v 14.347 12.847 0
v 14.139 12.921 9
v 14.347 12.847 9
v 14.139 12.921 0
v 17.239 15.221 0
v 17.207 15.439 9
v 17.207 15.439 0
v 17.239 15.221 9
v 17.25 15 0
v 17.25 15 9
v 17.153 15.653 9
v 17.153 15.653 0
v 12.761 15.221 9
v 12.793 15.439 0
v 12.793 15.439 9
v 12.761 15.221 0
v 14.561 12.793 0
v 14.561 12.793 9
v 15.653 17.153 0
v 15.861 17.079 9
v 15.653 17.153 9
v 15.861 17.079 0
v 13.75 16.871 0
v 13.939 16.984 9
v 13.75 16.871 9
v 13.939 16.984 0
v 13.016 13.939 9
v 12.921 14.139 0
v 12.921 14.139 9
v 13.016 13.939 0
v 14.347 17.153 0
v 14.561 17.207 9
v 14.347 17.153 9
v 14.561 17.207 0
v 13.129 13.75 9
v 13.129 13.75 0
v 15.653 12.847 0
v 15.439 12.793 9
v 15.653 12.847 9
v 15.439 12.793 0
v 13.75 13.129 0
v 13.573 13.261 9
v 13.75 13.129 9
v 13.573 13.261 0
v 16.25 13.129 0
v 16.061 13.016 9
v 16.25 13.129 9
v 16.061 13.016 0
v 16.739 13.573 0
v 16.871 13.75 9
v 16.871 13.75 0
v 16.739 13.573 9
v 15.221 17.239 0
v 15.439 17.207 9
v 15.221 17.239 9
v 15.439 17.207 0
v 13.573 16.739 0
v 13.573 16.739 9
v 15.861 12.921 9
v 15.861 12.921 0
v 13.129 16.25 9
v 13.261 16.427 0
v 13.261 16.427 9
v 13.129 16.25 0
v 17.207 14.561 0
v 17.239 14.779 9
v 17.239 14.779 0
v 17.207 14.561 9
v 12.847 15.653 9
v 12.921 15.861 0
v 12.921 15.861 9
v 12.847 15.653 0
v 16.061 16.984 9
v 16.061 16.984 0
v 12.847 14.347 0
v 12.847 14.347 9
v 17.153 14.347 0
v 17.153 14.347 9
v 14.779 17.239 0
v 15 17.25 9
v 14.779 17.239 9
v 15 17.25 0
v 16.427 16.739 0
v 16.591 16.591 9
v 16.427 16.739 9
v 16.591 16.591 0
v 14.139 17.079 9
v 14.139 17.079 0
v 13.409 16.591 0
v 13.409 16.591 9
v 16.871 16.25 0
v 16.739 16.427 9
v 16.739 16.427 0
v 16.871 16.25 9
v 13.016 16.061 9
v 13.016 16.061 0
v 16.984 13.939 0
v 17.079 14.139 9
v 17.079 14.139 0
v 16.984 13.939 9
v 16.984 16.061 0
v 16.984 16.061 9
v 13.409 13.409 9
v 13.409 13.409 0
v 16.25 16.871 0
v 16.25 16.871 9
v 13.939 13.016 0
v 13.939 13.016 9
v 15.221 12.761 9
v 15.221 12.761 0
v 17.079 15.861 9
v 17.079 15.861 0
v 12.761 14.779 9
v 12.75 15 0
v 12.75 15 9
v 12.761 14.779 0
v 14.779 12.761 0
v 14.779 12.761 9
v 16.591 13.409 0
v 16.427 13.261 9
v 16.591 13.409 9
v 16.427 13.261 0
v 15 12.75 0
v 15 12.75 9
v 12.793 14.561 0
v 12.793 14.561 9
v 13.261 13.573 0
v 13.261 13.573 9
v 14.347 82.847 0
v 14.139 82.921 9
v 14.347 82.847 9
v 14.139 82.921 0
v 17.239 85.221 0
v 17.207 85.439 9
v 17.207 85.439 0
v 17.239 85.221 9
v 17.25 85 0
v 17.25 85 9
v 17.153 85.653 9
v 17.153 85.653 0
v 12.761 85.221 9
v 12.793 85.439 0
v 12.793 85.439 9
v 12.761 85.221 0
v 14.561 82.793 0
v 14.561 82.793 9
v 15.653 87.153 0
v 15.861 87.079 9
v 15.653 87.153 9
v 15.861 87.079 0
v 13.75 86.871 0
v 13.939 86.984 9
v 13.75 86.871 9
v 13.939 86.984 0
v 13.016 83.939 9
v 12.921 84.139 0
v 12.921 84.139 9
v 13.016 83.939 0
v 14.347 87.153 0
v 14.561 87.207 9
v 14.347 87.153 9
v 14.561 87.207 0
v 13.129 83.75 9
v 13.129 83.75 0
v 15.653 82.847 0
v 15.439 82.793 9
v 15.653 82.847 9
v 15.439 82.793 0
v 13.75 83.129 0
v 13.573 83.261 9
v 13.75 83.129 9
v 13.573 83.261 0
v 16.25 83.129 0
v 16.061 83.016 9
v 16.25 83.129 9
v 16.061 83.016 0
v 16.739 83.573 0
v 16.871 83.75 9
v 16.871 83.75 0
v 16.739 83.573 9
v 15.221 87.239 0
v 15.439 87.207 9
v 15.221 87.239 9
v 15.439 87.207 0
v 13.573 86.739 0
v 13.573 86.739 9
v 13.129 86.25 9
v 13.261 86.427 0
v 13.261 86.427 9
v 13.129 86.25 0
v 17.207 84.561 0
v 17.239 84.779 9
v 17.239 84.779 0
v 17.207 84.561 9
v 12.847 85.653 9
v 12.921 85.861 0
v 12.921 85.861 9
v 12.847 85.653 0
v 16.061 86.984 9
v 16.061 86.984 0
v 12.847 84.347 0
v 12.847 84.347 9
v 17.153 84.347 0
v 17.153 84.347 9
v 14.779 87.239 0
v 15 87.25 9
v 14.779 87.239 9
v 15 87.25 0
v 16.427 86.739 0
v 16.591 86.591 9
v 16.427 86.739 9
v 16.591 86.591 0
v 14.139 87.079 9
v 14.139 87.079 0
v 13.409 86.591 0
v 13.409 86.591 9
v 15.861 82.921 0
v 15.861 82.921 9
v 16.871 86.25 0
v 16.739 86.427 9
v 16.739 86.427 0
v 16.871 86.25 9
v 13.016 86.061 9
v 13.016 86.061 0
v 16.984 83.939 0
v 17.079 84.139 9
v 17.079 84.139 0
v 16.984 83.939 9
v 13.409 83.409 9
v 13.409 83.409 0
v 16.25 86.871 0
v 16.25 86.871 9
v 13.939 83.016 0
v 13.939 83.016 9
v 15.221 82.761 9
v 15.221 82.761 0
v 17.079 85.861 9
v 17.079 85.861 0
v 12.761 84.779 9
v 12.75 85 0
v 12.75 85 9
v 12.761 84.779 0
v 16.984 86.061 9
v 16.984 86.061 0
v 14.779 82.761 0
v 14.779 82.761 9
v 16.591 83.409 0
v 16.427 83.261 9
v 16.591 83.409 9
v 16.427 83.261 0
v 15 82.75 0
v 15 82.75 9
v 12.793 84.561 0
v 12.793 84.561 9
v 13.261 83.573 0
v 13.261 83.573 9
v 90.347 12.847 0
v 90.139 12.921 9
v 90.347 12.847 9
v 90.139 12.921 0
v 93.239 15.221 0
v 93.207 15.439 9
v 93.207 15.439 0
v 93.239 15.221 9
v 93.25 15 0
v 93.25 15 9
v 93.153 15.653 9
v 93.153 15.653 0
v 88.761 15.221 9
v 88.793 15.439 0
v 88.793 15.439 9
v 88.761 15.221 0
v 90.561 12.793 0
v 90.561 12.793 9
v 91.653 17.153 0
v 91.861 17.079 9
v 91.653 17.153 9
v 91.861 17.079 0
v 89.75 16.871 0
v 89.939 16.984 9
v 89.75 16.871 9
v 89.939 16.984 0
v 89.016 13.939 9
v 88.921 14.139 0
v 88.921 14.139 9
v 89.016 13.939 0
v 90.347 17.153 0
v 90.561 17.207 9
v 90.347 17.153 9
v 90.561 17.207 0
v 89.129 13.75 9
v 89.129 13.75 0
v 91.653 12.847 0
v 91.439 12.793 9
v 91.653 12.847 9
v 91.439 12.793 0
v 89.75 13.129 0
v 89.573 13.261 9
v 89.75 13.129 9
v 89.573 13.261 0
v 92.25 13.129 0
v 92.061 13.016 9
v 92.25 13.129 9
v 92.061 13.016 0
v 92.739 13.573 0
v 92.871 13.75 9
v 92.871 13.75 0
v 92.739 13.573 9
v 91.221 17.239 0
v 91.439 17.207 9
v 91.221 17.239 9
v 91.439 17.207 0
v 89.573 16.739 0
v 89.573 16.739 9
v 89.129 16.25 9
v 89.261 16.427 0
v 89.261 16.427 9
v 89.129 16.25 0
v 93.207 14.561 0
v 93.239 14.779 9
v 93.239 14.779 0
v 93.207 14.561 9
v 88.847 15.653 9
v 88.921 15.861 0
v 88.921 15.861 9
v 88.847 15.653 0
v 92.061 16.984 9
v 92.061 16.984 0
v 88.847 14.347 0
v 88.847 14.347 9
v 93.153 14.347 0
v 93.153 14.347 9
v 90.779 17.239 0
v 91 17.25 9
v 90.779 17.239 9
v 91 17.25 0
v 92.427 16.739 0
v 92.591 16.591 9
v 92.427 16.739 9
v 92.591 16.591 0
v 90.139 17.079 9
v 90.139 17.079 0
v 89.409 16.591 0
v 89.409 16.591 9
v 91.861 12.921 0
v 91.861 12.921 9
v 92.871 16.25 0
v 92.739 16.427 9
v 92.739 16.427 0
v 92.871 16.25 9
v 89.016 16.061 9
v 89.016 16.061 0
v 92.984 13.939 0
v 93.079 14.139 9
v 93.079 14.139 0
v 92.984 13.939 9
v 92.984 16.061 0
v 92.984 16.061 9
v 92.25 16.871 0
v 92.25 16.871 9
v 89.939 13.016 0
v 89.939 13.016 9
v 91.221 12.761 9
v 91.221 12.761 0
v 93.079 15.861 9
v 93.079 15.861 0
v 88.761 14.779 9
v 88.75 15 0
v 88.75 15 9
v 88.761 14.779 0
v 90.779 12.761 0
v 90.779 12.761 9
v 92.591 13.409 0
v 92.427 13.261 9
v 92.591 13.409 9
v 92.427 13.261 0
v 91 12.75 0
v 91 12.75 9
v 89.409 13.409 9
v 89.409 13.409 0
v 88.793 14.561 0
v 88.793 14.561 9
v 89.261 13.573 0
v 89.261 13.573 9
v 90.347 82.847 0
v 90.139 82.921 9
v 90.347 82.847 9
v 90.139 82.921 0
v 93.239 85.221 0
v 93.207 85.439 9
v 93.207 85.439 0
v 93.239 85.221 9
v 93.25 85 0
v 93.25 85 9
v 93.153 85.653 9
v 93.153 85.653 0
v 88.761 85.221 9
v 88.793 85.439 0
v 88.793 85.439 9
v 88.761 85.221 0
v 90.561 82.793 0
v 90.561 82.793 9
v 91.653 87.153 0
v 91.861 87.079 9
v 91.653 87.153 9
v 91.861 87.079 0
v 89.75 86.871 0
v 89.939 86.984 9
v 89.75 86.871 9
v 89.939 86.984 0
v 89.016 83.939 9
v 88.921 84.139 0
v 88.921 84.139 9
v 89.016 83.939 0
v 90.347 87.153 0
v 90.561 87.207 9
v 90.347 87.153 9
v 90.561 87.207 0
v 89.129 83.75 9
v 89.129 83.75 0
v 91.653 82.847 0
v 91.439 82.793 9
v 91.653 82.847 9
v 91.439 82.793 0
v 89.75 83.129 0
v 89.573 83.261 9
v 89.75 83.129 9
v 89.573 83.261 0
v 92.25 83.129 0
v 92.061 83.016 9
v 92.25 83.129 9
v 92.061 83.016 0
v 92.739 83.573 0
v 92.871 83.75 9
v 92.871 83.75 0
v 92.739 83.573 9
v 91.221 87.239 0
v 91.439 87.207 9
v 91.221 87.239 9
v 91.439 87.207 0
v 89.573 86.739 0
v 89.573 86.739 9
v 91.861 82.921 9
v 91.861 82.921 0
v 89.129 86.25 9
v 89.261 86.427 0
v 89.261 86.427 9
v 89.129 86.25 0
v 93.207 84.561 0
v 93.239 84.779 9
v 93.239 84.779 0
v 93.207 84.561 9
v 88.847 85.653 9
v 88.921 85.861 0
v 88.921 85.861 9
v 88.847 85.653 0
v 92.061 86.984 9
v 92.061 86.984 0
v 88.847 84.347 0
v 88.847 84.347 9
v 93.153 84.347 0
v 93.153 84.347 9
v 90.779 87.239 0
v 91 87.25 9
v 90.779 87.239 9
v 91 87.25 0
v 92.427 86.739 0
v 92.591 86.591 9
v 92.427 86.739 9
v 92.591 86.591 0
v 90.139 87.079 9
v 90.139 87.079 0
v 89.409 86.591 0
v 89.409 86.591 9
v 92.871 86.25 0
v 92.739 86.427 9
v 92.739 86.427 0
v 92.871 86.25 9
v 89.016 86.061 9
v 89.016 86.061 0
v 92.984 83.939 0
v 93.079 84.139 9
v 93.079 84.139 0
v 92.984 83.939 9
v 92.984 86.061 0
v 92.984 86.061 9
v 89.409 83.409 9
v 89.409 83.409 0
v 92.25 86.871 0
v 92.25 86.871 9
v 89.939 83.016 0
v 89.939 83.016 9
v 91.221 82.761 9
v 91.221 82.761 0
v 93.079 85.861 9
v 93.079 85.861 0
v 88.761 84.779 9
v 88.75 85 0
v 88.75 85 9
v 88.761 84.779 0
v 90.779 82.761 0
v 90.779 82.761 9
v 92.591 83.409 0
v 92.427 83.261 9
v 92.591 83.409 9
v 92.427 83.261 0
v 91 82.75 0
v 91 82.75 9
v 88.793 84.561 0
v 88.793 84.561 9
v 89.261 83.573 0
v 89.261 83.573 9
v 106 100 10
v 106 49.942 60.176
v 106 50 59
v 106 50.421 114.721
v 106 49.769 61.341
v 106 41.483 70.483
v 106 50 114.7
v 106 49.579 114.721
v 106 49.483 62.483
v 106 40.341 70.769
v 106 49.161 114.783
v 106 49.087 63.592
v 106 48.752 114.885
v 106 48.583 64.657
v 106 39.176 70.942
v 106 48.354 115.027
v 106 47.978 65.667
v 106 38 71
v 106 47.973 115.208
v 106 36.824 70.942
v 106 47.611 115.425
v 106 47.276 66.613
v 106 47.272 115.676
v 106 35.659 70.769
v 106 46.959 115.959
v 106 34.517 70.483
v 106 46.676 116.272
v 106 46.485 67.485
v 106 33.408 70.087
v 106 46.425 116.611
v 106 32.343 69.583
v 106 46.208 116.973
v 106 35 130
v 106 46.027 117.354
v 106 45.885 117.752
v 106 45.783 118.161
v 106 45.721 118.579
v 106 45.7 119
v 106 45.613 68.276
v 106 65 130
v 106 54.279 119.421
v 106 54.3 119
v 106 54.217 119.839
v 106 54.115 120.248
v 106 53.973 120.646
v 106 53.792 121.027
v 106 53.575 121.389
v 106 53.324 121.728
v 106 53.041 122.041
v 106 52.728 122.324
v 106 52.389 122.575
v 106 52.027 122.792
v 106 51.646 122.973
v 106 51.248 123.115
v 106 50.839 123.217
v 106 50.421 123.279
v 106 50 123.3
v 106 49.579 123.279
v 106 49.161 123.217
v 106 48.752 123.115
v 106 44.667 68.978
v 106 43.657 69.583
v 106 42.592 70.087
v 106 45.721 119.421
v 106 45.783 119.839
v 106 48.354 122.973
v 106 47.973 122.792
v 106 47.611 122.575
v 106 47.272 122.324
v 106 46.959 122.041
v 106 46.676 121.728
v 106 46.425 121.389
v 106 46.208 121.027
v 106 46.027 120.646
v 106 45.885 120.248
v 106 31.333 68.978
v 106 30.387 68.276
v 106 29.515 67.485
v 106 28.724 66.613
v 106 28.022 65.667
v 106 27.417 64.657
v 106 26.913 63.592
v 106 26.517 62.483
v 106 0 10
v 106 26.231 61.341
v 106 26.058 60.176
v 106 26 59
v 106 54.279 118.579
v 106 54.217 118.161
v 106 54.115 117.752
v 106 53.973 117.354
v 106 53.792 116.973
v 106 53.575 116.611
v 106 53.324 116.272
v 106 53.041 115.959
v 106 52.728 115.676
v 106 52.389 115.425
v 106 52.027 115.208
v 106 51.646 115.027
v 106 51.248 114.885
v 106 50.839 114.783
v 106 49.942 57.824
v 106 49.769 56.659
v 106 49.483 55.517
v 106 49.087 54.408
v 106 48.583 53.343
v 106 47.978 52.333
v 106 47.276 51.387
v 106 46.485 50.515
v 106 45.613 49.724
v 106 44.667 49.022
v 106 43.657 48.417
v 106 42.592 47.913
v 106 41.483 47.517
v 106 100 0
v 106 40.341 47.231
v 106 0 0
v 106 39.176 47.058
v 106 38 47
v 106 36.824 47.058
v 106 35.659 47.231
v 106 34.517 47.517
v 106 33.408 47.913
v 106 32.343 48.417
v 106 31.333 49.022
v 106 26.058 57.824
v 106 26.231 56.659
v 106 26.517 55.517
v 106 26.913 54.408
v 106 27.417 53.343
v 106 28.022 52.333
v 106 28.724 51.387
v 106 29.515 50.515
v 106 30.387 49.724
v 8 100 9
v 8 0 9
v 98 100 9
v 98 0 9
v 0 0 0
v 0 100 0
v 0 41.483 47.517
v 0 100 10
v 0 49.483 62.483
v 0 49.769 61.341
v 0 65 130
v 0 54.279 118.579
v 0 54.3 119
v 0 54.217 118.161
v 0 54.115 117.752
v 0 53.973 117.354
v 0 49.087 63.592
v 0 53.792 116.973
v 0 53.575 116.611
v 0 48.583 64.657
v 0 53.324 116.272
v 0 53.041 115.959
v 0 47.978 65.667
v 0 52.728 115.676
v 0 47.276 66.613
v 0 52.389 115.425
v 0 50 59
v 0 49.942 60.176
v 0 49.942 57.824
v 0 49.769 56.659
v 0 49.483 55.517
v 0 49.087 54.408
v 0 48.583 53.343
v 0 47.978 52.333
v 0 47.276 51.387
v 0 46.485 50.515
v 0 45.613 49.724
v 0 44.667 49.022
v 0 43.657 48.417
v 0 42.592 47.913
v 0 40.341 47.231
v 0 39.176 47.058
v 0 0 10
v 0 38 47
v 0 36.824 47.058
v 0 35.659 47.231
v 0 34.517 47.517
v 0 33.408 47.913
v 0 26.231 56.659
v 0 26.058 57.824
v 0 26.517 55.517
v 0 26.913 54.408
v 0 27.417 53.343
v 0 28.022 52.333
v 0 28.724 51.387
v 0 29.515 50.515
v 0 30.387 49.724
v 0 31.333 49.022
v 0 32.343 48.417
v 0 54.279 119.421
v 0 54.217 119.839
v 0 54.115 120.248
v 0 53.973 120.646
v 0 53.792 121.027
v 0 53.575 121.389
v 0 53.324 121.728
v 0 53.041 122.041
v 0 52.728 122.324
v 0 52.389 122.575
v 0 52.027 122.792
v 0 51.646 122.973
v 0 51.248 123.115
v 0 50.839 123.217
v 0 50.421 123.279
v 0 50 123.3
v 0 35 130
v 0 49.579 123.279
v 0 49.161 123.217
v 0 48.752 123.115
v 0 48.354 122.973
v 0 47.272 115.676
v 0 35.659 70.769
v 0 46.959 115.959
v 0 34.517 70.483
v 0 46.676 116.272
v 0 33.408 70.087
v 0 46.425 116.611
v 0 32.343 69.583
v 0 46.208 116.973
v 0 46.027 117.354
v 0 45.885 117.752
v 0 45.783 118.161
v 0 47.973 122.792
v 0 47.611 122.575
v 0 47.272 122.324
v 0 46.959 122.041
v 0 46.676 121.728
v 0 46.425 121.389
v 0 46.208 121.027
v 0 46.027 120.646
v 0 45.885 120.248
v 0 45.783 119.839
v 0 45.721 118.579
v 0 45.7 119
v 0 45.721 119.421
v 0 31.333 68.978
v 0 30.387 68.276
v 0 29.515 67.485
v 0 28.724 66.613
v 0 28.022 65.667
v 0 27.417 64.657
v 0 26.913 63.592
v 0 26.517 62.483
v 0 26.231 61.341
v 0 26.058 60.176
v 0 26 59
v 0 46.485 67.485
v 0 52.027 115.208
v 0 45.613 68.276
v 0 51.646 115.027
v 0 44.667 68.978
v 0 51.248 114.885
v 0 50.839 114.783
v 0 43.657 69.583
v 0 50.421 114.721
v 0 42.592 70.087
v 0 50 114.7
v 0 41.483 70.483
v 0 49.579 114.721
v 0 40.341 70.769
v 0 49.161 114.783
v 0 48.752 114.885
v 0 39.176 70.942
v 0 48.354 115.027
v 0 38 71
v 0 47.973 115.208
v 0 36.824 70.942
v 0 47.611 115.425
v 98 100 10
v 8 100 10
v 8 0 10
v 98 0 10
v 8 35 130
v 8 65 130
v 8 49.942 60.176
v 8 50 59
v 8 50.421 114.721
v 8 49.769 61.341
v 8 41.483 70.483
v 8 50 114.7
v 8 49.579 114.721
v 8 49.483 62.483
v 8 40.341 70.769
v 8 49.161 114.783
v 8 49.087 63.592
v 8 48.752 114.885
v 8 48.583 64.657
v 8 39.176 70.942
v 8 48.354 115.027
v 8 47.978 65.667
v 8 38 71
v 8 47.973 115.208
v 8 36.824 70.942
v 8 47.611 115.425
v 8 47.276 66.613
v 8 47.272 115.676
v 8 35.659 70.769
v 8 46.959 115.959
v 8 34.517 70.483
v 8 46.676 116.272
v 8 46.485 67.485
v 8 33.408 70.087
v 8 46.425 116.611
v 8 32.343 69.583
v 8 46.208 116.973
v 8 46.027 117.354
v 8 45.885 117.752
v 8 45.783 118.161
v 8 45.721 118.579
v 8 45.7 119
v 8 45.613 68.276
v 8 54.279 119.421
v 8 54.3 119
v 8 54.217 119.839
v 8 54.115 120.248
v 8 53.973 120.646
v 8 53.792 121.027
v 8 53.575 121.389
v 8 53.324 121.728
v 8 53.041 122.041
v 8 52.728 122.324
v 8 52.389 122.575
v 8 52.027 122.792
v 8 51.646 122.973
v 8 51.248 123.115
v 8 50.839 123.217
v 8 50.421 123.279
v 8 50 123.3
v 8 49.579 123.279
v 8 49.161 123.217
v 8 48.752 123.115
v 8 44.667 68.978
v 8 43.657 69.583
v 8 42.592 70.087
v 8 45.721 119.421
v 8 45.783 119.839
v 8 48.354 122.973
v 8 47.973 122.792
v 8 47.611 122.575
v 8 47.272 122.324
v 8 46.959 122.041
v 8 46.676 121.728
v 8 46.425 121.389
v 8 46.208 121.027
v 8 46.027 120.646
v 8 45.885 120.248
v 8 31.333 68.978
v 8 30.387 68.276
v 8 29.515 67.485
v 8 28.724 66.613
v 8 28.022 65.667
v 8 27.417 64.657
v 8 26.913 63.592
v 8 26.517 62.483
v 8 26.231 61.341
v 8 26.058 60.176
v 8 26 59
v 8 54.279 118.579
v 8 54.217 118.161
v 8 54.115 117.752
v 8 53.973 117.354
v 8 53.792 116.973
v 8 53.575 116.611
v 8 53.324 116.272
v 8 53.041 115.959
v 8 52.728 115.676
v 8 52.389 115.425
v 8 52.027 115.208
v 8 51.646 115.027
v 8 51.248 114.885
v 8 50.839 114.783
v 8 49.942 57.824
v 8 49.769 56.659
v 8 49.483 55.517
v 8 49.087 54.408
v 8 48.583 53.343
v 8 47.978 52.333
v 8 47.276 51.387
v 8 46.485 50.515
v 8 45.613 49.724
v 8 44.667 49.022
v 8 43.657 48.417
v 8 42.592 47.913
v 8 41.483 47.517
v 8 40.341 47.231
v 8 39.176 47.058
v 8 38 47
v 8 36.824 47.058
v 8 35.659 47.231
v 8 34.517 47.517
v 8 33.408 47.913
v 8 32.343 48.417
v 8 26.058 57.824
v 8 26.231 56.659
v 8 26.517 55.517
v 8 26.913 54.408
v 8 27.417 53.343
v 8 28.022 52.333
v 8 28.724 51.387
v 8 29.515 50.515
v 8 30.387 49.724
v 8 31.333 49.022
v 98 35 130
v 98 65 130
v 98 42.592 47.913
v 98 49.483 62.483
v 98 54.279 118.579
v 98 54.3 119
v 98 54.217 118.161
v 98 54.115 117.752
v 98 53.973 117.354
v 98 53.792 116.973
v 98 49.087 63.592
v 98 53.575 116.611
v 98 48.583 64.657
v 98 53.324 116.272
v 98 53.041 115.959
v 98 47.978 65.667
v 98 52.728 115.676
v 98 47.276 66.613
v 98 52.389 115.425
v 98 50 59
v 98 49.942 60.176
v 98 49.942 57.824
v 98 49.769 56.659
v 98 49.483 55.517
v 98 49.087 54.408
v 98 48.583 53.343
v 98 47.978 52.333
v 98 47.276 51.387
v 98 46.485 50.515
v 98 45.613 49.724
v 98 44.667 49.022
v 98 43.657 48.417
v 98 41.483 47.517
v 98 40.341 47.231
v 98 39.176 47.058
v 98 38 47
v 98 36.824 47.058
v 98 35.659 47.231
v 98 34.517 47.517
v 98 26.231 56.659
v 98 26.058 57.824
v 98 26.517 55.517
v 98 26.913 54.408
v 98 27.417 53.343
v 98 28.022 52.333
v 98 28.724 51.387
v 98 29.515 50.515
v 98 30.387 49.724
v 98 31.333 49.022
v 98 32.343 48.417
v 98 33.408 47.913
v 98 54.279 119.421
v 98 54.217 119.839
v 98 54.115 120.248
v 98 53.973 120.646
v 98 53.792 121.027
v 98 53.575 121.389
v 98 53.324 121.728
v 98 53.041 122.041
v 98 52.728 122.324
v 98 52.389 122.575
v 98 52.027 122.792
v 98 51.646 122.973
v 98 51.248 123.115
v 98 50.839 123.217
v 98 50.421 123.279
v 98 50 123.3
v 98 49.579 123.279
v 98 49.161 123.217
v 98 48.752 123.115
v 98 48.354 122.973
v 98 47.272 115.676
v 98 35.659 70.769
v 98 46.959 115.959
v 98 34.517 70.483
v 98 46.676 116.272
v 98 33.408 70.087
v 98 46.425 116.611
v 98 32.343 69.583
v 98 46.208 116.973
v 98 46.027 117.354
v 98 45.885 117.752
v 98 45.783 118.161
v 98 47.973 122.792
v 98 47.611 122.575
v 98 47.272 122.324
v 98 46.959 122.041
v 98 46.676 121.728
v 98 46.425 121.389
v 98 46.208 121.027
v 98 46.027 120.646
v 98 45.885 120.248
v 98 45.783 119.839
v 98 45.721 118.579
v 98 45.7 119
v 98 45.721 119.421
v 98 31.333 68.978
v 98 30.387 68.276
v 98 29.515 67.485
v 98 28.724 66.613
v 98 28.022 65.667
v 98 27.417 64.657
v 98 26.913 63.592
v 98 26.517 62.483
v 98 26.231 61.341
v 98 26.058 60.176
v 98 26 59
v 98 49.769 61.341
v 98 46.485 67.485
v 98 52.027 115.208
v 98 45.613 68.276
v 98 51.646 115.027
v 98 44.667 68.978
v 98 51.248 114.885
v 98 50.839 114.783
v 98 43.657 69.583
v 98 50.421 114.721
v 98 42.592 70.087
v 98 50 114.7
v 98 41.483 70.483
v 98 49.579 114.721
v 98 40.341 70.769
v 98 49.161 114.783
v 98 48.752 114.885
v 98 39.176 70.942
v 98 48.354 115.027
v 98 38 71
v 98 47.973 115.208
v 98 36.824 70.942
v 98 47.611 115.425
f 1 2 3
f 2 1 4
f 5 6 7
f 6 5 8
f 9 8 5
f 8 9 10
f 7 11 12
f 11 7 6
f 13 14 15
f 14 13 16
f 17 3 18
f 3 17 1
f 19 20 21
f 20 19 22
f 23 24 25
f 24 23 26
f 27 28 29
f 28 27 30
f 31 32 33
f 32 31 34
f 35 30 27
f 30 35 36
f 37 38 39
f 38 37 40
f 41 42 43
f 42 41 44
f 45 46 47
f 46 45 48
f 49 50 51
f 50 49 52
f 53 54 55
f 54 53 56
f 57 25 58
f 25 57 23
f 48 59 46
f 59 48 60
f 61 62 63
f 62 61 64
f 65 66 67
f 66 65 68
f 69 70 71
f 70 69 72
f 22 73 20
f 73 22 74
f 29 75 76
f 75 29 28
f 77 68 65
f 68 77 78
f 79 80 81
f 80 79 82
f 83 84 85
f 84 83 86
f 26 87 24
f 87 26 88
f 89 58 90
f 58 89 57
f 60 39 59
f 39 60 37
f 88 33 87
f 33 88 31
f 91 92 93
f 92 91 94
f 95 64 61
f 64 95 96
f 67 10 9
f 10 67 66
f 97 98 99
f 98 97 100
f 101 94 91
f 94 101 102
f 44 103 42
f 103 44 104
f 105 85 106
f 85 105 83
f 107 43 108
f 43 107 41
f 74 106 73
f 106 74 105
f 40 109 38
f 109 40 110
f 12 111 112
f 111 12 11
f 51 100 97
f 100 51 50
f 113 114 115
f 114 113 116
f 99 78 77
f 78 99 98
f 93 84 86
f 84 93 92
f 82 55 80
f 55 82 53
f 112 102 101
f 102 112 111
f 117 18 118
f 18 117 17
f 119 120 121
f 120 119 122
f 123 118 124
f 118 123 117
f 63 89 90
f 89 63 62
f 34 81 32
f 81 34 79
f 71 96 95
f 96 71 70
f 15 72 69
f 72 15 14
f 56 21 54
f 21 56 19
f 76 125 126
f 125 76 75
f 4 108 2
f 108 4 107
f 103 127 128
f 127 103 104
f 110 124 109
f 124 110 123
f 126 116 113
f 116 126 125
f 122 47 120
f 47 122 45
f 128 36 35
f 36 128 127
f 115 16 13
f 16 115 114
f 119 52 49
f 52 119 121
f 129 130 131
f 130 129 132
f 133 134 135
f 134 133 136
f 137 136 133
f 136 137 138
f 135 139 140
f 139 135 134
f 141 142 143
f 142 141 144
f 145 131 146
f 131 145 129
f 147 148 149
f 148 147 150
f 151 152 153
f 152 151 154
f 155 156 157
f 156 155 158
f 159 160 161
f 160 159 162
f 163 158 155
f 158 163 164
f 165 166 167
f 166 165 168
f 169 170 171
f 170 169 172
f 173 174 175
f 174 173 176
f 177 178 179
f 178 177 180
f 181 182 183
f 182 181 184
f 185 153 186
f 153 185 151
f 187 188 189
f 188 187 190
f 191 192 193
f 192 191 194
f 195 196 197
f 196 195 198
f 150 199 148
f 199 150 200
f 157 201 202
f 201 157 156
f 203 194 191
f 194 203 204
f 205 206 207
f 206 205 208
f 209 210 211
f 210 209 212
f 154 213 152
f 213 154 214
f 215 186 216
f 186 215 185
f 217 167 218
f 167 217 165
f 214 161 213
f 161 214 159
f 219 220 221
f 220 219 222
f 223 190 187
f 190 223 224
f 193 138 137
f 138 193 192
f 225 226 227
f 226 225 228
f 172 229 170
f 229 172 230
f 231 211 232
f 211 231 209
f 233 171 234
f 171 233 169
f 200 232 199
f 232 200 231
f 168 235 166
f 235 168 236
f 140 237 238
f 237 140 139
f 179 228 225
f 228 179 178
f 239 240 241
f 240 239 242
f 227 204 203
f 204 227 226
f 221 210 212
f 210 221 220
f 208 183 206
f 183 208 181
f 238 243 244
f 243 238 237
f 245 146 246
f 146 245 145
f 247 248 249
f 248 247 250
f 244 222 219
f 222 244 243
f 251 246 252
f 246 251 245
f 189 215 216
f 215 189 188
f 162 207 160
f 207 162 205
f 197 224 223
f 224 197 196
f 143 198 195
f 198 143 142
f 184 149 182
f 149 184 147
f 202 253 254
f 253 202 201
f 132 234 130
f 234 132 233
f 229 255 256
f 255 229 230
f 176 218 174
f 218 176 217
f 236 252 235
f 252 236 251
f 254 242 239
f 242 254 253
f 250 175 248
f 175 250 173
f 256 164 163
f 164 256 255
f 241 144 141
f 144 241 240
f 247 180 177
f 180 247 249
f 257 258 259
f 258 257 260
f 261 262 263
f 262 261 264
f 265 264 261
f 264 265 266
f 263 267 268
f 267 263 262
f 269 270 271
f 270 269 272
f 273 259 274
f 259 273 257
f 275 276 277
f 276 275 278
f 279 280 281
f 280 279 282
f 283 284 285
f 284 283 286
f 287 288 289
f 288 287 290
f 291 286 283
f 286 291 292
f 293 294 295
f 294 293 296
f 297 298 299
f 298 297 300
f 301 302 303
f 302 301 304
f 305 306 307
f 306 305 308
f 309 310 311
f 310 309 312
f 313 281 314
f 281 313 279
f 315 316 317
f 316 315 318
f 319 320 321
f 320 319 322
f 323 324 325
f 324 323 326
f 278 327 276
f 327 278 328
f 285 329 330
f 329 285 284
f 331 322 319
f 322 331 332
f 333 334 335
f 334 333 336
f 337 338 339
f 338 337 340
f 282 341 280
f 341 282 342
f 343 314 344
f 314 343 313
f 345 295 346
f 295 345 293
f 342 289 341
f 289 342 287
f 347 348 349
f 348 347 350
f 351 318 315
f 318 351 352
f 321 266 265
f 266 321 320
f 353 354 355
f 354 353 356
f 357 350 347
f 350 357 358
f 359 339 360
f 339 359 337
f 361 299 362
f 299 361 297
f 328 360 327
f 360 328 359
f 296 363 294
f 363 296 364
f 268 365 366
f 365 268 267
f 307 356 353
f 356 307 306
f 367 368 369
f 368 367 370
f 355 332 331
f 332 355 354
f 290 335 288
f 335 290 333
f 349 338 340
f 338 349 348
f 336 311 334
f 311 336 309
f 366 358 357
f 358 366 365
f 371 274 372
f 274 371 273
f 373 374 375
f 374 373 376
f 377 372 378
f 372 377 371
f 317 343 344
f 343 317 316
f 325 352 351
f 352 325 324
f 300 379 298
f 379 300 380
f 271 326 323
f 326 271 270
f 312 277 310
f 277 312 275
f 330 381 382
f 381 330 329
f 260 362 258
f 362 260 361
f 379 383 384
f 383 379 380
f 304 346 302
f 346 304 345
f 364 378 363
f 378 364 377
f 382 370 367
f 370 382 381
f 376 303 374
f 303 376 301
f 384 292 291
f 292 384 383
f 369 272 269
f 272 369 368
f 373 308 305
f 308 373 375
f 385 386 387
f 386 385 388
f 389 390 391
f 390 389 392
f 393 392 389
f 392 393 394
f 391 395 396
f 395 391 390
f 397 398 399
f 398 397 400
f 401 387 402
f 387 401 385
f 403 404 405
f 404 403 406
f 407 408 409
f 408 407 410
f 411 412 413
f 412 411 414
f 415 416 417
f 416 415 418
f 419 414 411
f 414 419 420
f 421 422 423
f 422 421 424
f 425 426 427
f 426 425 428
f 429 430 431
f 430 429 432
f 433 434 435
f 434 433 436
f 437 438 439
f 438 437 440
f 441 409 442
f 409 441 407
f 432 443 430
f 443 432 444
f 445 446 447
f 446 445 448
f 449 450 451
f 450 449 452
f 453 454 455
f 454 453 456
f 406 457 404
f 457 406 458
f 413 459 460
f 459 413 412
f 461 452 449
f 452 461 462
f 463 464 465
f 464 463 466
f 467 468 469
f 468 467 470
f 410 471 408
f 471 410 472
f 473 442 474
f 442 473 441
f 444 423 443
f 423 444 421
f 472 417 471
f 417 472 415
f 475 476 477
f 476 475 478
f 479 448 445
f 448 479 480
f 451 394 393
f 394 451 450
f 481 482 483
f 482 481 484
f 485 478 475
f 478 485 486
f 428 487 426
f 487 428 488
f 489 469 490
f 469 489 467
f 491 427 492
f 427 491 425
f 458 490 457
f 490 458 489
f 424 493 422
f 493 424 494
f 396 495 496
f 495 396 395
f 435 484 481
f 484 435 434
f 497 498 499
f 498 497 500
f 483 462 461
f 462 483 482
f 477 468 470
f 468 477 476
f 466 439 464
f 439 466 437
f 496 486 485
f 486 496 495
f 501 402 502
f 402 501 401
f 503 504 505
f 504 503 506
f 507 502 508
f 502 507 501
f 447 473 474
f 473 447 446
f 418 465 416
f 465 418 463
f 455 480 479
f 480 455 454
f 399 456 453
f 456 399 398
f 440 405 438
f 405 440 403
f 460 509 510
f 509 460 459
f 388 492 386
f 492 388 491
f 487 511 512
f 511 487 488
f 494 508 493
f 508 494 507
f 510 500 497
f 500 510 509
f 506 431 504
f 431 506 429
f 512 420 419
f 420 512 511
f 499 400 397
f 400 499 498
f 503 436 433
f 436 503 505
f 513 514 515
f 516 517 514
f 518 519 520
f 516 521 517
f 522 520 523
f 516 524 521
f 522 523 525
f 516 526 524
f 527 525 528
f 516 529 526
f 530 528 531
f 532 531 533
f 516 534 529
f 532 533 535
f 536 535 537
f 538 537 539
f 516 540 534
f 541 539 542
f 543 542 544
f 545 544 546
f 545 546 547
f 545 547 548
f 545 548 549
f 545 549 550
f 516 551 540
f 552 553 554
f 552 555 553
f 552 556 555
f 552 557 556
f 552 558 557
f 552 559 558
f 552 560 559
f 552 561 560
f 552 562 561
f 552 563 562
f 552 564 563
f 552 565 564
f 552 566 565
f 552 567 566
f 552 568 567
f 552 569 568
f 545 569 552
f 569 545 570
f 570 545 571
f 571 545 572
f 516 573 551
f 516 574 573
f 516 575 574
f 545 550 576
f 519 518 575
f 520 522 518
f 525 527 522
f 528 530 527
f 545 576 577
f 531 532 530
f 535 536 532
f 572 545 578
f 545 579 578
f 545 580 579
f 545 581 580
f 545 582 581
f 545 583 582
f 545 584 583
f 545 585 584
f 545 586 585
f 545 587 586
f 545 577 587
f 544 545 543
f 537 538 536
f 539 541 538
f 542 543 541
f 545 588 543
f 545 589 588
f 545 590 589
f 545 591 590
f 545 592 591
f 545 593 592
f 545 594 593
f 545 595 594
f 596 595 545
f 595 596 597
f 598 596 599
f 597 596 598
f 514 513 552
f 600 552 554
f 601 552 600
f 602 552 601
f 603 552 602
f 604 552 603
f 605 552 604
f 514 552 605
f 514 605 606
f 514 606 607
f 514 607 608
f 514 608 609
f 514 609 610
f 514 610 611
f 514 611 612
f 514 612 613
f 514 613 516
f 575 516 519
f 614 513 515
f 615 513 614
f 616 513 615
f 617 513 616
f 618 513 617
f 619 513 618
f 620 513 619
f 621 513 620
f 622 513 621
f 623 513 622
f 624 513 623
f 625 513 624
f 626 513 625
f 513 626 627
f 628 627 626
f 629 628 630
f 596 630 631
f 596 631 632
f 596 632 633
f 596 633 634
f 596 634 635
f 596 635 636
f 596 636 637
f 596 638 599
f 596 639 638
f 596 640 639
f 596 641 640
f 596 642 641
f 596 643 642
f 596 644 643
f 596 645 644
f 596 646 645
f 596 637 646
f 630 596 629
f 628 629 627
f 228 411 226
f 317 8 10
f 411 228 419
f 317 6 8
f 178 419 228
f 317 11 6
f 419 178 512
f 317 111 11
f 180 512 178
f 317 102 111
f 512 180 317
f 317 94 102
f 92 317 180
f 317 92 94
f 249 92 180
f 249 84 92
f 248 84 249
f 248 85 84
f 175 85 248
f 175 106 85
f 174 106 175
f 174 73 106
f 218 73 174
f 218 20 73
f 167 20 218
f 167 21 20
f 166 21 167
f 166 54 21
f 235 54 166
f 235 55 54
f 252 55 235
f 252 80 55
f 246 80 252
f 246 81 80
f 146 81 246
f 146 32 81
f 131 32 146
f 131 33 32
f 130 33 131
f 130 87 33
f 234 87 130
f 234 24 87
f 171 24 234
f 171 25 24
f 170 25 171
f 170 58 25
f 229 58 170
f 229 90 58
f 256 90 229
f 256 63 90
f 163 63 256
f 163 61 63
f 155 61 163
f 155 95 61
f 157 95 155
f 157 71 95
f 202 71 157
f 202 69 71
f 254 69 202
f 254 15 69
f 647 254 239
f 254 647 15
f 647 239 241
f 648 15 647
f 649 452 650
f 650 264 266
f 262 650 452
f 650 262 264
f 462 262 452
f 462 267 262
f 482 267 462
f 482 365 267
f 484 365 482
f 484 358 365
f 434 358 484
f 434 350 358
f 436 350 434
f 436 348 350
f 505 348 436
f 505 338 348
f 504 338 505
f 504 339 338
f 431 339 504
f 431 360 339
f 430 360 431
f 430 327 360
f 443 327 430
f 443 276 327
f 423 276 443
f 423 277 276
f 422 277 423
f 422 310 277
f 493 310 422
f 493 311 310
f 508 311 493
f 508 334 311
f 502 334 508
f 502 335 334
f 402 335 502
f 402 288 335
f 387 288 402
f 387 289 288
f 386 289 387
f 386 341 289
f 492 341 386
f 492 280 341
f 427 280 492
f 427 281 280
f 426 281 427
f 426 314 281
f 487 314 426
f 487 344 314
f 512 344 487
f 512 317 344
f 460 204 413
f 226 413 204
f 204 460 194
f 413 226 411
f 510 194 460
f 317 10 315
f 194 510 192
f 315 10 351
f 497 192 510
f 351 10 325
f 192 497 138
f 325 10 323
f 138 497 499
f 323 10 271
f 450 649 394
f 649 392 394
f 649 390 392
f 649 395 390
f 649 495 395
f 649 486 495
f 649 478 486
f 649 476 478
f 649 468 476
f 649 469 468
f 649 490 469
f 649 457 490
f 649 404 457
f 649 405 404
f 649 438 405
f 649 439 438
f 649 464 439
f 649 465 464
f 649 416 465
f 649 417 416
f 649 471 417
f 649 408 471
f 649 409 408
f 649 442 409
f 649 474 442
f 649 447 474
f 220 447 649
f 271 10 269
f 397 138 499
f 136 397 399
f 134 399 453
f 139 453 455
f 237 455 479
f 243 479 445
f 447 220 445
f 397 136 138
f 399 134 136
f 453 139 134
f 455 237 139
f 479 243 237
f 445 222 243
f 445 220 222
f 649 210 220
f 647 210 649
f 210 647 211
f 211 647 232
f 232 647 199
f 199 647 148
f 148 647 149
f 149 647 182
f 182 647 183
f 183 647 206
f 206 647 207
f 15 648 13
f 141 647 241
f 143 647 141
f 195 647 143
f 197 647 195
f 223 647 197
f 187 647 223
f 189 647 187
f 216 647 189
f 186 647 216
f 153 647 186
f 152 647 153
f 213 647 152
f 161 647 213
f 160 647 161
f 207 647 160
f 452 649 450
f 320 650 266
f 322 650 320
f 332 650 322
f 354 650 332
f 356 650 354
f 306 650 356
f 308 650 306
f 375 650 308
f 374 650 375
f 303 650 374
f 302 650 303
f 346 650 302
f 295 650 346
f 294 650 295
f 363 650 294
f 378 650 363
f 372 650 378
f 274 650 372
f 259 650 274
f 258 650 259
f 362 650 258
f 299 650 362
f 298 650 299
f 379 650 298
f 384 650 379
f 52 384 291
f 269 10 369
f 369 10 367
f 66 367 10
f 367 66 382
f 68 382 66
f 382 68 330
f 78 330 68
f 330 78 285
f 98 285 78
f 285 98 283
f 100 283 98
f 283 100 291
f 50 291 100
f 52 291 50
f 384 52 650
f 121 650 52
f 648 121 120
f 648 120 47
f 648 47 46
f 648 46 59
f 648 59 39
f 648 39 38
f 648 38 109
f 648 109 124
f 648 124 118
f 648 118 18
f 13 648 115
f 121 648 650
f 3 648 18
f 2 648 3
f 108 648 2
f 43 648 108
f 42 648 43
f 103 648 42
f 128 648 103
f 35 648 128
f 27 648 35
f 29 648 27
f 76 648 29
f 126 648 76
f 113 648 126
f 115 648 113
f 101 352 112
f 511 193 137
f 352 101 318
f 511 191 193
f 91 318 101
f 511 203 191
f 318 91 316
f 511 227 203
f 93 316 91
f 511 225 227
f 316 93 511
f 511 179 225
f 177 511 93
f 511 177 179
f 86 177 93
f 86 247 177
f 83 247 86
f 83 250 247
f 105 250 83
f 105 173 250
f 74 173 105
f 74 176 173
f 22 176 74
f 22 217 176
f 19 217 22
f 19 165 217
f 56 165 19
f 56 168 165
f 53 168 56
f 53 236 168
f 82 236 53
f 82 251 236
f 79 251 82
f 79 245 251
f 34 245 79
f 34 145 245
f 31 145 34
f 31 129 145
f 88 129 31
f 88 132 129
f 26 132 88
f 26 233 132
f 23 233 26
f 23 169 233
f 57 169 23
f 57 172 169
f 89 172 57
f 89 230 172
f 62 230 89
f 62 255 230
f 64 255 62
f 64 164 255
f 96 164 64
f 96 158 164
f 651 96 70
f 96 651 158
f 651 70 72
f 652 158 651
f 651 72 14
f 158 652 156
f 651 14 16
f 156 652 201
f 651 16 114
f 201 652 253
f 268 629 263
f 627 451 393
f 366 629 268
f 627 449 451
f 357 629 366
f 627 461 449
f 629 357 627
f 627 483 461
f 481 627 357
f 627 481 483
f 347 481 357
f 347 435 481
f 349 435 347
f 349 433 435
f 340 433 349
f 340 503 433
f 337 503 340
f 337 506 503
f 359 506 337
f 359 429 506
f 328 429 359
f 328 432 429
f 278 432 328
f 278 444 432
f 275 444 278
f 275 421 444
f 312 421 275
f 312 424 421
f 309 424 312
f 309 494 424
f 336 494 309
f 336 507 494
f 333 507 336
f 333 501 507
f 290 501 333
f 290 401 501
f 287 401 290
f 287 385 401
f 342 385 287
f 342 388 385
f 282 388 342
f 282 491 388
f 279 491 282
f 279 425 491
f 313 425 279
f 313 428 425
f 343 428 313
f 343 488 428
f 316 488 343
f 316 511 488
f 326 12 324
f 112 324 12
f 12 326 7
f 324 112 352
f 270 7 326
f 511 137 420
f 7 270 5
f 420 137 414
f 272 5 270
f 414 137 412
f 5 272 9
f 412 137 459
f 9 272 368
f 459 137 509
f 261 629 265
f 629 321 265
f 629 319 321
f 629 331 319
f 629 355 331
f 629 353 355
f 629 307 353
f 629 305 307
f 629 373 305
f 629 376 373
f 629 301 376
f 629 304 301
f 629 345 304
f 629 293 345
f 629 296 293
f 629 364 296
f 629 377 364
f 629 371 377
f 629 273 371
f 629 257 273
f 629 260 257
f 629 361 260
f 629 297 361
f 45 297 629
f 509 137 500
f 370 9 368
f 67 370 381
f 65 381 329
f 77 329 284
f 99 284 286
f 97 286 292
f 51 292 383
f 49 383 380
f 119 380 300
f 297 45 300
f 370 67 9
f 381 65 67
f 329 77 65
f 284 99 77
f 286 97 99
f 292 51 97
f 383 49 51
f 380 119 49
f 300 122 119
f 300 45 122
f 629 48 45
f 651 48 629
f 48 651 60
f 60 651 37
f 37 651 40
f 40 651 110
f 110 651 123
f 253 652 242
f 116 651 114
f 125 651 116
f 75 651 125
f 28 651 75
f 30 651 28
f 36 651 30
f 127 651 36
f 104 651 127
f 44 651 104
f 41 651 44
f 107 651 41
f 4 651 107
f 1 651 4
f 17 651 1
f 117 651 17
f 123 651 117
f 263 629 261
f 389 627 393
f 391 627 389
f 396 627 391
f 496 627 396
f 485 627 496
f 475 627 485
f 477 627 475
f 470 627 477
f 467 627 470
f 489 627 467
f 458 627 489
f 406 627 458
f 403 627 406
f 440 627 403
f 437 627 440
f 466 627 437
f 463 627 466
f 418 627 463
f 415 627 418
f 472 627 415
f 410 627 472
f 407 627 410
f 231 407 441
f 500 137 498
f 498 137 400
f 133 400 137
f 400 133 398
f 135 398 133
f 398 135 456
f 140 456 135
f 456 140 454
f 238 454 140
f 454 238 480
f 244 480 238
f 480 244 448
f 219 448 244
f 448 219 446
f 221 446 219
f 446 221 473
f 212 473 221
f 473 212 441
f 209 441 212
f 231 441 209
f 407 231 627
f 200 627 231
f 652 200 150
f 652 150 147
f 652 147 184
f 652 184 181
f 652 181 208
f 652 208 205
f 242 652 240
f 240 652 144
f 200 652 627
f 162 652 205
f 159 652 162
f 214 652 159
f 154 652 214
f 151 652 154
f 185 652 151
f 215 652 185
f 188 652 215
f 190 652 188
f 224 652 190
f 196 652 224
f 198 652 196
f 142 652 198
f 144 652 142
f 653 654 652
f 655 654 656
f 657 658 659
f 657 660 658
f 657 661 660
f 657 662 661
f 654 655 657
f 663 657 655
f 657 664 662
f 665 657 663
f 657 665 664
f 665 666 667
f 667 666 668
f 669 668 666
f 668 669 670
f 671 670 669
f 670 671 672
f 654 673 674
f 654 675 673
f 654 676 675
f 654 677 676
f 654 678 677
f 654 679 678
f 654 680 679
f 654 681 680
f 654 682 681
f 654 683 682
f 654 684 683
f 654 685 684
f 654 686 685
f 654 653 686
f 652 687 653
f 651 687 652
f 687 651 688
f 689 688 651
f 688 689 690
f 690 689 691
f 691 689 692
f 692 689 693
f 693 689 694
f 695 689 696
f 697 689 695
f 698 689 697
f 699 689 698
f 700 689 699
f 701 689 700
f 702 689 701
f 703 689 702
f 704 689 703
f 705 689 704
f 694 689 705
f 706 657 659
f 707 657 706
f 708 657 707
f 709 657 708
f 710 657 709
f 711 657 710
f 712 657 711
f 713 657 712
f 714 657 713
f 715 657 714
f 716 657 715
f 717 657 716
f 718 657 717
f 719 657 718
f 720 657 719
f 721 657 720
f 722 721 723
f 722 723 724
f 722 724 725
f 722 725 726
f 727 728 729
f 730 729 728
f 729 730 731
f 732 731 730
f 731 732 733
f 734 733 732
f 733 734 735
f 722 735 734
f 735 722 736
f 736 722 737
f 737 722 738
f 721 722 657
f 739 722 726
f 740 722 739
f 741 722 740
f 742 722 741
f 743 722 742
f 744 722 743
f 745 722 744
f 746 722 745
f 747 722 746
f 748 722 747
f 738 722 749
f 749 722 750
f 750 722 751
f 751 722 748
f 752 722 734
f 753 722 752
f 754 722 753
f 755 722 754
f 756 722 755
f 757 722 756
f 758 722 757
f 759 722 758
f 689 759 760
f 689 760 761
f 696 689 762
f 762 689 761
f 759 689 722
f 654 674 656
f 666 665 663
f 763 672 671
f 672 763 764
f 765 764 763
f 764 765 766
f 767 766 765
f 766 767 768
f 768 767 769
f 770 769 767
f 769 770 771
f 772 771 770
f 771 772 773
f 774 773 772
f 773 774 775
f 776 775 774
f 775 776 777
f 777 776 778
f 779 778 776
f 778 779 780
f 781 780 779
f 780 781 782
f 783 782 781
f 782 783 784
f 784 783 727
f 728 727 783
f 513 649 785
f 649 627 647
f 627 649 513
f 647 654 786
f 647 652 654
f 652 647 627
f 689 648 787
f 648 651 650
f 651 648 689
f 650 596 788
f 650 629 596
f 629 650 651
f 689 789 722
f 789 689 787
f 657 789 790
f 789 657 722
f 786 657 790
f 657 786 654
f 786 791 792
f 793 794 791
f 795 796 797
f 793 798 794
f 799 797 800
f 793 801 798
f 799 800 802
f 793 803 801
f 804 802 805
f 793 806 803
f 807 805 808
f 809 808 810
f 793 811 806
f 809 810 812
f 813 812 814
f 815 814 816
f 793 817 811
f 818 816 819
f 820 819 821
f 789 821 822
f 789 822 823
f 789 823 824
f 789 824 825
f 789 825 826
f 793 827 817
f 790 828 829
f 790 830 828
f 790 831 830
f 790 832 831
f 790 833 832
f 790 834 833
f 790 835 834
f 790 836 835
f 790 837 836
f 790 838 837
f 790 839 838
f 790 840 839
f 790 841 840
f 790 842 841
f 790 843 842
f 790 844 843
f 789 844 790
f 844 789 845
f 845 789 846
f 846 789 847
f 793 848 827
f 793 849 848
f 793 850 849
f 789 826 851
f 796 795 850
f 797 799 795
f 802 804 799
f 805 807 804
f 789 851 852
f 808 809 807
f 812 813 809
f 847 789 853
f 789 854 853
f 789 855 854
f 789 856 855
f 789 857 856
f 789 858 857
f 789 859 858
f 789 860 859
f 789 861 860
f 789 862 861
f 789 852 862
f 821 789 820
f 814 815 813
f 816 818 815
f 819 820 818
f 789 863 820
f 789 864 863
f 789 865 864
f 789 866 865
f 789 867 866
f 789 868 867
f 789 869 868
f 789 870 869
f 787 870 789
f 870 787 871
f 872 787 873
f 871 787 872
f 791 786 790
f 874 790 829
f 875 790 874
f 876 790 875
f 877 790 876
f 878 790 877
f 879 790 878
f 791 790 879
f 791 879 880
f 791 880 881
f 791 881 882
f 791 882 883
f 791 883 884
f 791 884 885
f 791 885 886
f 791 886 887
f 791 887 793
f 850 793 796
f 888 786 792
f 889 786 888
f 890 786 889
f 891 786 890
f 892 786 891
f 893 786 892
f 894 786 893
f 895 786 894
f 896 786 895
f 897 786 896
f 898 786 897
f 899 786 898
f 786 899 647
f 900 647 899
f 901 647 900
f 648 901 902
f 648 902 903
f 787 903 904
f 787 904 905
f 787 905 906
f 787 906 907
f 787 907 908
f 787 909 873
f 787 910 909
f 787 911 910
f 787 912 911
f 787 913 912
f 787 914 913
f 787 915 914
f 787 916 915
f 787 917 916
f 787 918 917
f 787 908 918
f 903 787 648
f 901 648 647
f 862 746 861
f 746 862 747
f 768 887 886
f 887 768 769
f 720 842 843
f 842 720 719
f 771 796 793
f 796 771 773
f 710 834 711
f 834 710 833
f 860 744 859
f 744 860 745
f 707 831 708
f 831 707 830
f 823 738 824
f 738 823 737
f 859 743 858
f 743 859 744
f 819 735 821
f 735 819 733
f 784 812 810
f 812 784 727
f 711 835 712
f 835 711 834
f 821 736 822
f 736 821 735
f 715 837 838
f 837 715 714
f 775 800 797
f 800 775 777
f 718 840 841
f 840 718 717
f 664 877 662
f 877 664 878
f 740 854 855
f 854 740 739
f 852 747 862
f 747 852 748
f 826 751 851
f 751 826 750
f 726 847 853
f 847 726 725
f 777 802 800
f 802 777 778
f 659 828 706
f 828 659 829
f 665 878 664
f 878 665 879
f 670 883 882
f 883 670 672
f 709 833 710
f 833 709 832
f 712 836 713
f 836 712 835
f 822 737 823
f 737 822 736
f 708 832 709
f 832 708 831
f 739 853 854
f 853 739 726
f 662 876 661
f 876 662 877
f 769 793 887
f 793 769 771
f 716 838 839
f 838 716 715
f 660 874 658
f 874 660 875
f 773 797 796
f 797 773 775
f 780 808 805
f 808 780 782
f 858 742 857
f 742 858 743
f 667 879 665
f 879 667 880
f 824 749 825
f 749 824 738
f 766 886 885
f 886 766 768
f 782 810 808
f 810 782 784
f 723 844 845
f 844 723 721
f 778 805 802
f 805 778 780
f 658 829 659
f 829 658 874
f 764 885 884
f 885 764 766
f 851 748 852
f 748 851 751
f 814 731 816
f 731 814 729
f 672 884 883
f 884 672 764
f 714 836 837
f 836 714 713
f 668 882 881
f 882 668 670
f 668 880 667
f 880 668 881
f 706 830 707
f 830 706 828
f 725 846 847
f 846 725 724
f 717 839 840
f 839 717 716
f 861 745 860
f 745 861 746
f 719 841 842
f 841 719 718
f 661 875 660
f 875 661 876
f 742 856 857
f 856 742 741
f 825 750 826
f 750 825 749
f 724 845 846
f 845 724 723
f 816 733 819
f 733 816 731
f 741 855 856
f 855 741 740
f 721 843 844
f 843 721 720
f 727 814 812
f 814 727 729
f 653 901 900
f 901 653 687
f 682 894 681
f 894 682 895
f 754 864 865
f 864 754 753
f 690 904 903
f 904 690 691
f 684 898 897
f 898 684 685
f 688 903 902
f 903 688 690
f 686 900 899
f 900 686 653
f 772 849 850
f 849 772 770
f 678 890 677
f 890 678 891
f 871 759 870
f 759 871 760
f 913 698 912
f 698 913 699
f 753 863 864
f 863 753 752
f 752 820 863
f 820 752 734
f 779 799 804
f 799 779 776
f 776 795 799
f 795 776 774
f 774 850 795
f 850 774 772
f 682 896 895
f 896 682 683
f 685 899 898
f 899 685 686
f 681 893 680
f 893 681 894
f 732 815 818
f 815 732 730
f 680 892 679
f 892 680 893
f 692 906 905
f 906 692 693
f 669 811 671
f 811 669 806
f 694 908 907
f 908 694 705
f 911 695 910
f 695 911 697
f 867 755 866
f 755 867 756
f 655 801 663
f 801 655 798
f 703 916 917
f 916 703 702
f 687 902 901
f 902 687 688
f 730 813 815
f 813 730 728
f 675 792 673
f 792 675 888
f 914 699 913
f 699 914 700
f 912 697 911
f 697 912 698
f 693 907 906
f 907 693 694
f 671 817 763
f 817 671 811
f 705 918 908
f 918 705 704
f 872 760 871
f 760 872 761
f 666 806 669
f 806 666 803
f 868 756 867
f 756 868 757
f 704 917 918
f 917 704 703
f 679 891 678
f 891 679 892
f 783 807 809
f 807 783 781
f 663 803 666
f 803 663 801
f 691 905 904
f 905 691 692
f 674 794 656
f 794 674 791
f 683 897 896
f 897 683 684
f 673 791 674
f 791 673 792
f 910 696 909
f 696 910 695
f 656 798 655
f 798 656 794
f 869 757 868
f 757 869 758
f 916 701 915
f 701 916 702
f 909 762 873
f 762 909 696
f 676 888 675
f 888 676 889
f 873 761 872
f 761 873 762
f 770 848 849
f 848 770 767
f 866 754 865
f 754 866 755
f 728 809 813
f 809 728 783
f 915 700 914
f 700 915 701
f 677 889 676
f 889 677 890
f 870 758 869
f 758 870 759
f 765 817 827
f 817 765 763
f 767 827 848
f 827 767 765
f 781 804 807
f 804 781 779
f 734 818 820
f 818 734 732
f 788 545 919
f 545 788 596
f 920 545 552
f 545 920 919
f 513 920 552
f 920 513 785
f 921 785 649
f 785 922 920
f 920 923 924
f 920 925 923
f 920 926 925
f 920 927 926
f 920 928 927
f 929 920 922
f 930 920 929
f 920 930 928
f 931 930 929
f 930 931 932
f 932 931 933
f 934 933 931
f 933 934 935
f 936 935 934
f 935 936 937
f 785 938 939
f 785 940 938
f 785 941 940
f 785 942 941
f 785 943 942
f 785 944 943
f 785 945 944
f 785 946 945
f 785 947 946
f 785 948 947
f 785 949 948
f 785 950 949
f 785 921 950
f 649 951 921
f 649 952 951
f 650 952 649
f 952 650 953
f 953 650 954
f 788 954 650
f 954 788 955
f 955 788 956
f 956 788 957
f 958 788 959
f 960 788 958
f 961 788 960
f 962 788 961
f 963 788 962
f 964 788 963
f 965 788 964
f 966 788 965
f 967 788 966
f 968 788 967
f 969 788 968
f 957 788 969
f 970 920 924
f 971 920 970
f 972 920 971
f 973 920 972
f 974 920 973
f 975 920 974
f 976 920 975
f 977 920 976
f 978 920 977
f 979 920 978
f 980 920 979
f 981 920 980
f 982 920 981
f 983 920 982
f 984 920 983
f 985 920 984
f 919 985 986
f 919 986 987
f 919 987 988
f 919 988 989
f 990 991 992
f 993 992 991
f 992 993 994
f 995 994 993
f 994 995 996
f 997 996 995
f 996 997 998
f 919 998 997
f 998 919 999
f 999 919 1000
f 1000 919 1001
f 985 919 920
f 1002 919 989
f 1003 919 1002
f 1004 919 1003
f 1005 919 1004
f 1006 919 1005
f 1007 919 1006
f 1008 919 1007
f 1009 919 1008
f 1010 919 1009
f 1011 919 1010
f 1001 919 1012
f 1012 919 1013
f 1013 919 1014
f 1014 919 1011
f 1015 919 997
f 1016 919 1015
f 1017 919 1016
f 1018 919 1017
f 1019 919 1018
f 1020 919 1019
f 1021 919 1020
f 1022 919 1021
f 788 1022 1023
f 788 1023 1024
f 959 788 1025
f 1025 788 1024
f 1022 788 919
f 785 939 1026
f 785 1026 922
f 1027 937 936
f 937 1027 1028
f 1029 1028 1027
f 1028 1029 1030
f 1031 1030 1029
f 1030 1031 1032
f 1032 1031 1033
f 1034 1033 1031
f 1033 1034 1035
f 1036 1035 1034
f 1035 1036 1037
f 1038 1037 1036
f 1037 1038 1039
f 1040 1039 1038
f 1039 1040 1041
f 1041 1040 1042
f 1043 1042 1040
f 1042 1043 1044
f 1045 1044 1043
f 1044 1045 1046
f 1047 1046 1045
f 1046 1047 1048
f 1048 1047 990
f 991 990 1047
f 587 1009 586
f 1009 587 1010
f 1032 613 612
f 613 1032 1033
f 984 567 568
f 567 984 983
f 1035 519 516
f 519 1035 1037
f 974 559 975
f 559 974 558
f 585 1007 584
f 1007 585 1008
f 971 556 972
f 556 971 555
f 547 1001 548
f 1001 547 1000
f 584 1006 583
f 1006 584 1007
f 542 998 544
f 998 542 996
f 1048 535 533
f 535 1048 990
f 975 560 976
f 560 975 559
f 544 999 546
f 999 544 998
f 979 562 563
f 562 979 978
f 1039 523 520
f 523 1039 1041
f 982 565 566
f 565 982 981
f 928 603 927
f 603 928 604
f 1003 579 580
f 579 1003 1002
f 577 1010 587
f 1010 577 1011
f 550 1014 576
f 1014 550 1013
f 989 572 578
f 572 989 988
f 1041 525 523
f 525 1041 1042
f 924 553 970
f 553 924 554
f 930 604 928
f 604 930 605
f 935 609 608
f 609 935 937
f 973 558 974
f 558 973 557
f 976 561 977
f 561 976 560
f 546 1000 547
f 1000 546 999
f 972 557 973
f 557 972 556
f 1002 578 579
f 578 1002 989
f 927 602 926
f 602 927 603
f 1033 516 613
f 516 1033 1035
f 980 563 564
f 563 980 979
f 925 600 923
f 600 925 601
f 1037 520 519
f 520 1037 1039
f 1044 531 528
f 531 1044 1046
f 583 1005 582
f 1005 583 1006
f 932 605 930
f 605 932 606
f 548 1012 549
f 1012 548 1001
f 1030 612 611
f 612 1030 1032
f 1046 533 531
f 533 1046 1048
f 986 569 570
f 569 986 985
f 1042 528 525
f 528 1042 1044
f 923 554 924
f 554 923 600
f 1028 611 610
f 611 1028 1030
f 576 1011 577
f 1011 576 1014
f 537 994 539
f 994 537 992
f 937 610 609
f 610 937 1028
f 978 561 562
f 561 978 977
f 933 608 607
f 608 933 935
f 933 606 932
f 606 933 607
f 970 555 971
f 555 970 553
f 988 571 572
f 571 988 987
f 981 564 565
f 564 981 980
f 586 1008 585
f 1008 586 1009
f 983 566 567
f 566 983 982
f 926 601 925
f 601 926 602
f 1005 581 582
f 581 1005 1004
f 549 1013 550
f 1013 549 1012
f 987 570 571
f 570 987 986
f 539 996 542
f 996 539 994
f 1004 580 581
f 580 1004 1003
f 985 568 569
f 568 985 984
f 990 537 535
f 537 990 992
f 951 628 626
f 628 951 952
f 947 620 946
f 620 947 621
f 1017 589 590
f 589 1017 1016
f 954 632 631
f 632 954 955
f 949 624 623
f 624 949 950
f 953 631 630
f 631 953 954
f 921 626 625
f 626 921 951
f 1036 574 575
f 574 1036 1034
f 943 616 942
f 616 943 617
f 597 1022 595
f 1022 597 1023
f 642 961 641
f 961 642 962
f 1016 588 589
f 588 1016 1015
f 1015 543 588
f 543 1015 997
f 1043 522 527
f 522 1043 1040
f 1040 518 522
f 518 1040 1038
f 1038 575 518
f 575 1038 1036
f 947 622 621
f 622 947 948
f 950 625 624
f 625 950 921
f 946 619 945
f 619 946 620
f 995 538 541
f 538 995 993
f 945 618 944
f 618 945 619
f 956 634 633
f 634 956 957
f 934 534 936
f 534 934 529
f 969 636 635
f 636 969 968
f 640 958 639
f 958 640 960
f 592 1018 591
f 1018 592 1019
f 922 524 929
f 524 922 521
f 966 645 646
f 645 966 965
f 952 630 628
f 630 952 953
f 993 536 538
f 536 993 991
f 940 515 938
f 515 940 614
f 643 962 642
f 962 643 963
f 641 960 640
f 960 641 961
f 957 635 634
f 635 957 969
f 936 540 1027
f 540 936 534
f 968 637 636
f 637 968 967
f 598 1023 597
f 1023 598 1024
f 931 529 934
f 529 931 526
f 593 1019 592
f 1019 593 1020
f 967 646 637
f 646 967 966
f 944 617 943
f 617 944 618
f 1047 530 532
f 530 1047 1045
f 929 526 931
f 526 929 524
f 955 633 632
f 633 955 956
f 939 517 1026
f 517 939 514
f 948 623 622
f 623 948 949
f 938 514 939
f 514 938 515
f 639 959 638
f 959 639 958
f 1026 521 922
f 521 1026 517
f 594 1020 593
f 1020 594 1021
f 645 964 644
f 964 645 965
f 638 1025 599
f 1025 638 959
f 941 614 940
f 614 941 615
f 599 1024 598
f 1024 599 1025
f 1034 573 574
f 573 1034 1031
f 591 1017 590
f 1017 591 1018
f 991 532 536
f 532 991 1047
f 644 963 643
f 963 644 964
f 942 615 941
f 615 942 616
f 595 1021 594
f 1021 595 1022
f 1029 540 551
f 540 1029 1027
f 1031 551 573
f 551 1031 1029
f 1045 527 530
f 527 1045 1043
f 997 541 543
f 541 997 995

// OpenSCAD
// file: params.scad
// Общие параметры установки Selkorin Sky Sentinel.
// Все размеры в миллиметрах. Подключается в остальные .scad через include.

// --- Основание / поворотная платформа ---
base_d       = 160;   // диаметр опорной платформы
base_h       = 12;    // толщина платформы
bearing_d    = 60;    // посадочный диаметр упорного подшипника азимута
bearing_h    = 15;

// --- Вилка (yoke) возвышения ---
yoke_h       = 120;   // высота щёк вилки
yoke_w       = 90;    // расстояние между внутренними поверхностями щёк
yoke_t       = 8;     // толщина щеки
yoke_base    = 100;   // ширина основания вилки

// --- Оптическая площадка ---
optics_l     = 140;   // длина площадки
optics_w     = 70;    // ширина
optics_t     = 6;     // толщина
optics_axle  = 8;     // диаметр оси возвышения

// --- Крепёж двигателя NEMA17 ---
motor_flange = 42.3;  // фланец
motor_hole   = 31.0;  // межцентровое отверстий крепления
motor_shaft  = 5.0;   // вал
motor_bore   = 22.0;  // центральная выборка

// --- Прочее ---
wall         = 3;     // толщина стенок печатных деталей
m3           = 3.4;   // отверстие под M3 (с зазором)
m4           = 4.5;   // отверстие под M4
$fn          = 64;    // гладкость окружностей
// main file
// U-образная вилка возвышения (устанавливается на поворотную платформу).
// openscad -o gimbal.stl gimbal.scad
include <params.scad>;

module cheek() {
    difference() {
        // щека
        hull() {
            translate([0, 0, 0]) cube([yoke_t, yoke_base, 1], center = false);
            translate([0, yoke_base/2 - 15, yoke_h]) cube([yoke_t, 30, 1]);
        }
        // отверстие оси возвышения
        translate([-1, yoke_base/2, yoke_h - 10])
            rotate([0, 90, 0])
                cylinder(d = optics_axle + 0.6, h = yoke_t + 2);
        // облегчение
        translate([-1, yoke_base/2 - 12, yoke_h/2 - 10])
            rotate([0, 90, 0])
                cylinder(d = 24, h = yoke_t + 2);
    }
}

module yoke() {
    // основание вилки, крепится к платформе
    difference() {
        cube([yoke_w + 2*yoke_t, yoke_base, wall*3], center = false);
        for (x = [15, yoke_w + 2*yoke_t - 15], y = [15, yoke_base - 15])
            translate([x, y, -1]) cylinder(d = m4, h = wall*3 + 2);
    }
    // левая щека
    translate([0, 0, wall*3]) cheek();
    // правая щека
    translate([yoke_w + yoke_t, 0, wall*3]) cheek();
}

yoke();
